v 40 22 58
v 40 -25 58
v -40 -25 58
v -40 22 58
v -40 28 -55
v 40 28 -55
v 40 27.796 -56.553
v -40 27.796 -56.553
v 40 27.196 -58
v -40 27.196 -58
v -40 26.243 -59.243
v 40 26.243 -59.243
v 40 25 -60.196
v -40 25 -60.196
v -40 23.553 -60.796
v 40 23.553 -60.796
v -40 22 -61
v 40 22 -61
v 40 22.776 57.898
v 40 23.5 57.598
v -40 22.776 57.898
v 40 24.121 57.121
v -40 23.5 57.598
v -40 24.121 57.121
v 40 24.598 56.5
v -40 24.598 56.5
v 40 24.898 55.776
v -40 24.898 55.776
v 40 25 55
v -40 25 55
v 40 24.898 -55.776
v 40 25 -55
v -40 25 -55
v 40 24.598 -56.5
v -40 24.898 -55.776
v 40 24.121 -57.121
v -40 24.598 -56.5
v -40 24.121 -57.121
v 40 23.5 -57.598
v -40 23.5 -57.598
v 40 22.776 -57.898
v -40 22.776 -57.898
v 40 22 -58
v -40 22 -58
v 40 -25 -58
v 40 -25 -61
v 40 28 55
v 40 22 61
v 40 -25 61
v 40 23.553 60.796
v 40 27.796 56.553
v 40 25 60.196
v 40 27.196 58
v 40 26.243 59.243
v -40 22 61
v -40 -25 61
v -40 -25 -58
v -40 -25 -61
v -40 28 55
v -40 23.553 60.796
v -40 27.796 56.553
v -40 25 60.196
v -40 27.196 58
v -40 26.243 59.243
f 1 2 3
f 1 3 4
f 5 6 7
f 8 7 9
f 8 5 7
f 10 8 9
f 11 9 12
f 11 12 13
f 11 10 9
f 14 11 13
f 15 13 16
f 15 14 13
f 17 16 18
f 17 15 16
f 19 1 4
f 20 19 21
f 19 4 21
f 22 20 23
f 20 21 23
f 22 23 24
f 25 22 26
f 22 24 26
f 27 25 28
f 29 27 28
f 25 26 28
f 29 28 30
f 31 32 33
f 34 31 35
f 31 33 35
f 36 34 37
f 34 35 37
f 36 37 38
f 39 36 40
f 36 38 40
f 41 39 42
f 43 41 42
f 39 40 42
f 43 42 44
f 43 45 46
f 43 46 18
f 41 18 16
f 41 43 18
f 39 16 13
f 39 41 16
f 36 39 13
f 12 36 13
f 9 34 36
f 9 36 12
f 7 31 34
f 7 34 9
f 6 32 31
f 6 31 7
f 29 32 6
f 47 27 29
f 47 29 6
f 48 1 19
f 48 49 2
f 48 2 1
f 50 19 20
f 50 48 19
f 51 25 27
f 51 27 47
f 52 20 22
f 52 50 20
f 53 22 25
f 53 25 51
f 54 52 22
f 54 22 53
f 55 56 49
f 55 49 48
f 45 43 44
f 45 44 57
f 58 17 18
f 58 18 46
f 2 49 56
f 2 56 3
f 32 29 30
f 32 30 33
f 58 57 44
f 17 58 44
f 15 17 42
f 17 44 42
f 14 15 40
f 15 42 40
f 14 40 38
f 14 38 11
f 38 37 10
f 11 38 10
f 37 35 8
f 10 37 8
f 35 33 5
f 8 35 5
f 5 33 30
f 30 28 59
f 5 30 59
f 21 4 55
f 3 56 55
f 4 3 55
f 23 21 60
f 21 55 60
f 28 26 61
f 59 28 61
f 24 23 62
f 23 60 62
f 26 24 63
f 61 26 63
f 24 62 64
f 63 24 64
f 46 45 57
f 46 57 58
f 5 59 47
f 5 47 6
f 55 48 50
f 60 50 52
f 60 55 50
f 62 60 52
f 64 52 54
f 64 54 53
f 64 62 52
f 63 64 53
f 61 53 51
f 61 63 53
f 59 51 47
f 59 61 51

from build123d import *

# Parameters (mm, degrees)
EXTRUDE_1_DEPTH       = 40
SHEET_START           = -40
SHEET_METAL_1_DEPTH   = 80
SHEET_METAL_1_2_DEPTH = 80


# Read off the part's stored shape, not the designer's step: Преобразовать-Твердое тело1
with BuildPart() as part:
    # Sketch 1 → Вытянуть-Тонкостенный1 (new, symmetric)
    with BuildSketch(Plane(origin=(0, 0, 0), x_dir=(0, 0, -1), z_dir=(1, 0, 0))):
        Polygon((-58, -25), (-58, 25), (58, 25), (58, -25), (64, -25), (64, 31), (-64, 31), (-64, -25), align=None)
    extrude(amount=EXTRUDE_1_DEPTH, both=True)

    # Sheet Metal 1 outline → Sheet Metal 1 (cut)
    with BuildSketch(Plane.YZ.offset(SHEET_START)):
        with BuildLine():
            Line((-25, 64), (-25, 61))
            Line((-25, 61), (22, 61))
            ThreePointArc((22, 61), (26.242640687, 59.242640687), (28, 55))
            Line((28, 55), (28, -55))
            ThreePointArc((28, -55), (26.242640687, -59.242640687), (22, -61))
            Line((22, -61), (-25, -61))
            Line((-25, -61), (-25, -64))
            Line((-25, -64), (31, -64))
            Line((31, -64), (31, 64))
            Line((31, 64), (-25, 64))
        make_face()
    extrude(amount=SHEET_METAL_1_DEPTH, mode=Mode.SUBTRACT)

    # Sheet Metal 1 2 outline → Sheet Metal 1 2 (add)
    with BuildSketch(Plane.YZ.offset(SHEET_START)):
        with BuildLine():
            ThreePointArc((22, 58), (24.121320344, 57.121320344), (25, 55))
            Line((25, 55), (25, 58))
            Line((25, 58), (22, 58))
        make_face()
        with BuildLine():
            Line((25, -58), (25, -55))
            ThreePointArc((25, -55), (24.121320344, -57.121320344), (22, -58))
            Line((22, -58), (25, -58))
        make_face()
    extrude(amount=SHEET_METAL_1_2_DEPTH)


solid = part.part
